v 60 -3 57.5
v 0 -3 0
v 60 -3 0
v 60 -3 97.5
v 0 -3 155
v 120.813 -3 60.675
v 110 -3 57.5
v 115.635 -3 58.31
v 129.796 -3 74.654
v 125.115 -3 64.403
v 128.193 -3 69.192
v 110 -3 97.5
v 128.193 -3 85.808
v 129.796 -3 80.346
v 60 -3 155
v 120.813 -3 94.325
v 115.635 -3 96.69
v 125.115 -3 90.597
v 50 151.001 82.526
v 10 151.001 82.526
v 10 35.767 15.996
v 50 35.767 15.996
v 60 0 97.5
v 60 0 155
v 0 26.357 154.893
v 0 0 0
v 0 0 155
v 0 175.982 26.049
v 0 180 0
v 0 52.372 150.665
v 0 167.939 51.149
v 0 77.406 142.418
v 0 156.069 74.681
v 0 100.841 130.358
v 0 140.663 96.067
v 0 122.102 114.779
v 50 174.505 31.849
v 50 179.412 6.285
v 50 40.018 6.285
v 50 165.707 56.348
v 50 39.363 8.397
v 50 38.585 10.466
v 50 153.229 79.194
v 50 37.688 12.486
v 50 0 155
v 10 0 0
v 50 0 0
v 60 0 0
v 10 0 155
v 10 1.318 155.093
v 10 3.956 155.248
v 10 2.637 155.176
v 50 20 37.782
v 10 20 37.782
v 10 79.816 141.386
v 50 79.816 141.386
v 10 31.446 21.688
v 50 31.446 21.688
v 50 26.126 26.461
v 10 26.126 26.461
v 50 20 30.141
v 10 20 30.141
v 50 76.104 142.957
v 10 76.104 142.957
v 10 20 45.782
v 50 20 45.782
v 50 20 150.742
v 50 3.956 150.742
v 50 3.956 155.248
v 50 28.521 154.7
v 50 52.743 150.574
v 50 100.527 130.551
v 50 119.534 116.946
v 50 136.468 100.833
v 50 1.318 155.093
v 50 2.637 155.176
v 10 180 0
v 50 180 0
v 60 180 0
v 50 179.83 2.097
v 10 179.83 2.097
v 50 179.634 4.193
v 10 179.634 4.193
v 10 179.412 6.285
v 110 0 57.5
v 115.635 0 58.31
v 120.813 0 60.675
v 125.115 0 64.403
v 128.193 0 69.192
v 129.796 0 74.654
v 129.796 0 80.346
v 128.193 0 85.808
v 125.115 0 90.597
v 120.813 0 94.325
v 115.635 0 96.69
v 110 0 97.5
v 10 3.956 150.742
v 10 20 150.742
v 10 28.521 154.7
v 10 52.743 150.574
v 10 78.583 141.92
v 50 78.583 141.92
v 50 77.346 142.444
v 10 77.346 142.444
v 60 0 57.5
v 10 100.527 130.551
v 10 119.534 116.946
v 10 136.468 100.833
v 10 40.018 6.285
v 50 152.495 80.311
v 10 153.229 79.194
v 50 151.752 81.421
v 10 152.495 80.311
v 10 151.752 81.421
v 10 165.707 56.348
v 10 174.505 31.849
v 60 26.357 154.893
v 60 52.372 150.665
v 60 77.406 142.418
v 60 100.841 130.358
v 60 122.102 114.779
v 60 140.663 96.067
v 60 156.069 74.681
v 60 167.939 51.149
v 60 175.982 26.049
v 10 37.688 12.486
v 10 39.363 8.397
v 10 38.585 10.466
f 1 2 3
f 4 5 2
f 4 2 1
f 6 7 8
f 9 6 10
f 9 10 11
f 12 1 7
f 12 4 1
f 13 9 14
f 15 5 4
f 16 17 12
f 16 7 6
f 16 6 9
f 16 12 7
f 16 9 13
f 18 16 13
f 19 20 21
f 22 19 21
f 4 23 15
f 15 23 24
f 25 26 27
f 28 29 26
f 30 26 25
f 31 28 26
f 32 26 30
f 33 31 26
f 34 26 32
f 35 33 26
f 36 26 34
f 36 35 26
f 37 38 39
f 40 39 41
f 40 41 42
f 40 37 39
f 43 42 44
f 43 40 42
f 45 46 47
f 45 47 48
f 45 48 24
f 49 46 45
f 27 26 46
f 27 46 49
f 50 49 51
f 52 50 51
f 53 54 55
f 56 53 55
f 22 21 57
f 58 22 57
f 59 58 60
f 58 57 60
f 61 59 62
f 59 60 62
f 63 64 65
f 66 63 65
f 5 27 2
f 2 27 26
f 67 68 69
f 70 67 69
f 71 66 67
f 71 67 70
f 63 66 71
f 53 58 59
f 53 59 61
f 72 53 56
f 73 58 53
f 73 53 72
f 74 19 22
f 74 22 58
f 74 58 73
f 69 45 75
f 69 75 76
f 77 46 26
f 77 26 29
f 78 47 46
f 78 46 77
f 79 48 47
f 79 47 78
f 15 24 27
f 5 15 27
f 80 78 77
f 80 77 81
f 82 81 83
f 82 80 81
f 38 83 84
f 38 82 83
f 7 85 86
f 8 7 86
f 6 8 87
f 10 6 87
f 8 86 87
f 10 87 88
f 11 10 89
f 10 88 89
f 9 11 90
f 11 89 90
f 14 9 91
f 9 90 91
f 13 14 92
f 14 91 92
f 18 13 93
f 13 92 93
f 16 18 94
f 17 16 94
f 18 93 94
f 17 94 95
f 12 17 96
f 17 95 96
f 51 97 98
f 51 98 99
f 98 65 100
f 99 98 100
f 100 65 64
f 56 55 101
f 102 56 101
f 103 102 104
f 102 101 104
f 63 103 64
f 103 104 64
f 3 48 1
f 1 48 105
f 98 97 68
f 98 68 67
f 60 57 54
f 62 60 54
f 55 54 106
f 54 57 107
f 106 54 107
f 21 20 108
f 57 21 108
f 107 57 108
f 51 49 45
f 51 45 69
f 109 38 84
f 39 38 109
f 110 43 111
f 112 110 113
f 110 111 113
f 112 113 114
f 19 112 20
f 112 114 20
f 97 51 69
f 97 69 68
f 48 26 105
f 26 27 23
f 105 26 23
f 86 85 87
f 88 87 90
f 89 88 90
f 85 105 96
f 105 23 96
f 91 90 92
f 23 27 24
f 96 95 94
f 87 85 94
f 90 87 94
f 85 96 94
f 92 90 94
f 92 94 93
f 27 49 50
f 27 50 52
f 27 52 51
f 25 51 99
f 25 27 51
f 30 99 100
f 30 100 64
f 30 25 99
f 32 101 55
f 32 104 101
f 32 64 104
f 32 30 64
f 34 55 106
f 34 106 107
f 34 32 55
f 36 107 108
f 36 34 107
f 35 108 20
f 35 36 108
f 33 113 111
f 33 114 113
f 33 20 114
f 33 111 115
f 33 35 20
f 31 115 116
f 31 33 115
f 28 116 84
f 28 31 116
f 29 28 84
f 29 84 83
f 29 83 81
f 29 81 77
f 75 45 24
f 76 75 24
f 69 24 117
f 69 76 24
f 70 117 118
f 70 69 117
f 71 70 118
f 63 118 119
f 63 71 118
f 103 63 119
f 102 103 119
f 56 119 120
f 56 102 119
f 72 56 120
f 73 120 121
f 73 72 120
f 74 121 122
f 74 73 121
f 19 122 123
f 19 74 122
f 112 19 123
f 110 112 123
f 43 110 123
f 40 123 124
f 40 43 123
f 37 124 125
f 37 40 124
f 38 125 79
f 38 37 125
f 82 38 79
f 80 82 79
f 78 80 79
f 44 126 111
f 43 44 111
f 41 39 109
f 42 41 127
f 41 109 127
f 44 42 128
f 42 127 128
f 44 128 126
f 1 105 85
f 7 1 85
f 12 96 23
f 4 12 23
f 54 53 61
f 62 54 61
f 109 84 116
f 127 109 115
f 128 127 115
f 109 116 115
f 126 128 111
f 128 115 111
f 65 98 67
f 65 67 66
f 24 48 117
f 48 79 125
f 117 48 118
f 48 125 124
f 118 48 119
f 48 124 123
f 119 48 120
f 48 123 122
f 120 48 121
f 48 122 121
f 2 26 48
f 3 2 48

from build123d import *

# Parameters (mm, degrees)
BOSS_EXTRUDE1_DEPTH  = 10
SKETCH2_W            = 150.741836367
SKETCH2_H            = 20
BOSS_EXTRUDE2_DEPTH  = 40
BOSS_EXTRUDE3_START  = 50
BOSS_EXTRUDE3_DEPTH  = 10
BOSS_EXTRUDE4_REACH  = 52
BOSS_EXTRUDE5_REACH  = 52
BOSS_EXTRUDE8_DEPTH  = 40
BOSS_EXTRUDE9_DEPTH  = 40
BOSS_EXTRUDE10_DEPTH = 3


with BuildPart() as part:
    # Sketch1 → Boss-Extrude1 (new body)
    with BuildSketch(Plane(origin=(0, 0, 0), x_dir=(0, 0, -1), z_dir=(1, 0, 0))):
        with BuildLine():
            Line((0, 0), (-155, 0))
            ThreePointArc((-155, 0), (-114.779220614, 122.101551084), (0, 180))
            Line((0, 180), (0, 0))
        make_face()
    extrude(amount=BOSS_EXTRUDE1_DEPTH)

    # Sketch2 → Boss-Extrude2 (add)
    with BuildSketch(Plane(origin=(10, 0, 0), x_dir=(0, 0, -1), z_dir=(1, 0, 0))):
        with Locations((-75.370918184, 10)):
            Rectangle(SKETCH2_W, SKETCH2_H)
    extrude(amount=BOSS_EXTRUDE2_DEPTH)

    # Sketch1<2> → Boss-Extrude3 (add)
    with BuildSketch(Plane(origin=(0, 0, 0), x_dir=(0, 0, -1), z_dir=(1, 0, 0)).offset(BOSS_EXTRUDE3_START)):
        with BuildLine():
            Line((0, 0), (-155, 0))
            ThreePointArc((-155, 0), (-114.779220614, 122.101551084), (0, 180))
            Line((0, 180), (0, 0))
        make_face()
    extrude(amount=BOSS_EXTRUDE3_DEPTH)

    # Sketch3 → Boss-Extrude4 (add, up to next)
    with BuildSketch(Plane(origin=(10, 0, 0), x_dir=(0, 0, -1), z_dir=(1, 0, 0)), mode=Mode.PRIVATE) as boss_extrude4_sk1:
        Polygon((-155, 0), (-155.248344232, 3.956405475), (-150.741836367, 3.956405475), (-150.741836367, 0), align=None)
    boss_extrude4_tool1 = extrude(boss_extrude4_sk1.sketch, amount=BOSS_EXTRUDE4_REACH, mode=Mode.PRIVATE) - part.part
    add(boss_extrude4_tool1.solids().sort_by_distance((10, 1.996887, 152.933591))[0])

    # Sketch4 → Boss-Extrude5 (add, up to next)
    with BuildSketch(Plane.ZY.offset(-50), mode=Mode.PRIVATE) as boss_extrude5_sk1:
        with BuildLine():
            Line((6.285027821, 179.412020927), (6.285027821, 20))
            Line((6.285027821, 20), (0, 20))
            Line((0, 20), (0, 180))
            ThreePointArc((0, 180), (3.145276325, 179.735538474), (6.285027821, 179.412020927))
        make_face()
    boss_extrude5_tool1 = extrude(boss_extrude5_sk1.sketch, amount=BOSS_EXTRUDE5_REACH, mode=Mode.PRIVATE) - part.part
    add(boss_extrude5_tool1.solids().sort_by_distance((50, 99.863025, 3.140586))[0])

    # Sketch5 → Boss-Extrude8 (add)
    with BuildSketch(Plane(origin=(10, 0, 0), x_dir=(0, 0, -1), z_dir=(1, 0, 0))):
        with BuildLine():
            ThreePointArc((-15.995737166, 35.766562367), (-14.26647513, 36.773818207), (-12.486075374, 37.687649826))
            Line((-12.486075374, 37.687649826), (-79.194018797, 153.229197102))
            ThreePointArc((-79.194018797, 153.229197102), (-80.866814116, 152.124990678), (-82.526313815, 151.000901379))
            Line((-82.526313815, 151.000901379), (-15.995737166, 35.766562367))
        make_face()
        with BuildLine():
            Line((-142.957405316, 76.104206878), (-32.791687428, 12.5))
            ThreePointArc((-32.791687428, 12.5), (-32.260504097, 14.48758469), (-31.621412378, 16.443143538))
            Line((-31.621412378, 16.443143538), (-141.38648706, 79.816038953))
            ThreePointArc((-141.38648706, 79.816038953), (-142.183080399, 77.964835127), (-142.957405316, 76.104206878))
        make_face()
    extrude(amount=BOSS_EXTRUDE8_DEPTH)

    # Sketch5<4> → Boss-Extrude9 (add)
    with BuildSketch(Plane(origin=(10, 0, 0), x_dir=(0, 0, -1), z_dir=(1, 0, 0))):
        with BuildLine():
            Line((-6.285027821, 20), (-6.285027821, 40.017504829))
            ThreePointArc((-6.285027821, 40.017504829), (-9.436955605, 38.989392149), (-12.486075374, 37.687649826))
            ThreePointArc((-12.486075374, 37.687649826), (-14.26647513, 36.773818207), (-15.995737166, 35.766562367))
            ThreePointArc((-15.995737166, 35.766562367), (-24.201304285, 28.899827943), (-30.140701221, 20))
            Line((-30.140701221, 20), (-6.285027821, 20))
        make_face()
    extrude(amount=BOSS_EXTRUDE9_DEPTH)


with BuildPart() as body_2:
    # Sketch6 → Boss-Extrude10 (new body)
    with BuildSketch(Plane.XZ):
        with BuildLine():
            Line((110, 97.5), (60, 97.5))
            Line((60, 97.5), (60, 57.5))
            Line((60, 57.5), (110, 57.5))
            ThreePointArc((110, 57.5), (130, 77.5), (110, 97.5))
        make_face()
        Polygon((10, 155), (0, 155), (0, 0), (60, 0), (60, 155), (50, 155), align=None)
    extrude(amount=BOSS_EXTRUDE10_DEPTH)


solid = Compound([part.part, body_2.part])
